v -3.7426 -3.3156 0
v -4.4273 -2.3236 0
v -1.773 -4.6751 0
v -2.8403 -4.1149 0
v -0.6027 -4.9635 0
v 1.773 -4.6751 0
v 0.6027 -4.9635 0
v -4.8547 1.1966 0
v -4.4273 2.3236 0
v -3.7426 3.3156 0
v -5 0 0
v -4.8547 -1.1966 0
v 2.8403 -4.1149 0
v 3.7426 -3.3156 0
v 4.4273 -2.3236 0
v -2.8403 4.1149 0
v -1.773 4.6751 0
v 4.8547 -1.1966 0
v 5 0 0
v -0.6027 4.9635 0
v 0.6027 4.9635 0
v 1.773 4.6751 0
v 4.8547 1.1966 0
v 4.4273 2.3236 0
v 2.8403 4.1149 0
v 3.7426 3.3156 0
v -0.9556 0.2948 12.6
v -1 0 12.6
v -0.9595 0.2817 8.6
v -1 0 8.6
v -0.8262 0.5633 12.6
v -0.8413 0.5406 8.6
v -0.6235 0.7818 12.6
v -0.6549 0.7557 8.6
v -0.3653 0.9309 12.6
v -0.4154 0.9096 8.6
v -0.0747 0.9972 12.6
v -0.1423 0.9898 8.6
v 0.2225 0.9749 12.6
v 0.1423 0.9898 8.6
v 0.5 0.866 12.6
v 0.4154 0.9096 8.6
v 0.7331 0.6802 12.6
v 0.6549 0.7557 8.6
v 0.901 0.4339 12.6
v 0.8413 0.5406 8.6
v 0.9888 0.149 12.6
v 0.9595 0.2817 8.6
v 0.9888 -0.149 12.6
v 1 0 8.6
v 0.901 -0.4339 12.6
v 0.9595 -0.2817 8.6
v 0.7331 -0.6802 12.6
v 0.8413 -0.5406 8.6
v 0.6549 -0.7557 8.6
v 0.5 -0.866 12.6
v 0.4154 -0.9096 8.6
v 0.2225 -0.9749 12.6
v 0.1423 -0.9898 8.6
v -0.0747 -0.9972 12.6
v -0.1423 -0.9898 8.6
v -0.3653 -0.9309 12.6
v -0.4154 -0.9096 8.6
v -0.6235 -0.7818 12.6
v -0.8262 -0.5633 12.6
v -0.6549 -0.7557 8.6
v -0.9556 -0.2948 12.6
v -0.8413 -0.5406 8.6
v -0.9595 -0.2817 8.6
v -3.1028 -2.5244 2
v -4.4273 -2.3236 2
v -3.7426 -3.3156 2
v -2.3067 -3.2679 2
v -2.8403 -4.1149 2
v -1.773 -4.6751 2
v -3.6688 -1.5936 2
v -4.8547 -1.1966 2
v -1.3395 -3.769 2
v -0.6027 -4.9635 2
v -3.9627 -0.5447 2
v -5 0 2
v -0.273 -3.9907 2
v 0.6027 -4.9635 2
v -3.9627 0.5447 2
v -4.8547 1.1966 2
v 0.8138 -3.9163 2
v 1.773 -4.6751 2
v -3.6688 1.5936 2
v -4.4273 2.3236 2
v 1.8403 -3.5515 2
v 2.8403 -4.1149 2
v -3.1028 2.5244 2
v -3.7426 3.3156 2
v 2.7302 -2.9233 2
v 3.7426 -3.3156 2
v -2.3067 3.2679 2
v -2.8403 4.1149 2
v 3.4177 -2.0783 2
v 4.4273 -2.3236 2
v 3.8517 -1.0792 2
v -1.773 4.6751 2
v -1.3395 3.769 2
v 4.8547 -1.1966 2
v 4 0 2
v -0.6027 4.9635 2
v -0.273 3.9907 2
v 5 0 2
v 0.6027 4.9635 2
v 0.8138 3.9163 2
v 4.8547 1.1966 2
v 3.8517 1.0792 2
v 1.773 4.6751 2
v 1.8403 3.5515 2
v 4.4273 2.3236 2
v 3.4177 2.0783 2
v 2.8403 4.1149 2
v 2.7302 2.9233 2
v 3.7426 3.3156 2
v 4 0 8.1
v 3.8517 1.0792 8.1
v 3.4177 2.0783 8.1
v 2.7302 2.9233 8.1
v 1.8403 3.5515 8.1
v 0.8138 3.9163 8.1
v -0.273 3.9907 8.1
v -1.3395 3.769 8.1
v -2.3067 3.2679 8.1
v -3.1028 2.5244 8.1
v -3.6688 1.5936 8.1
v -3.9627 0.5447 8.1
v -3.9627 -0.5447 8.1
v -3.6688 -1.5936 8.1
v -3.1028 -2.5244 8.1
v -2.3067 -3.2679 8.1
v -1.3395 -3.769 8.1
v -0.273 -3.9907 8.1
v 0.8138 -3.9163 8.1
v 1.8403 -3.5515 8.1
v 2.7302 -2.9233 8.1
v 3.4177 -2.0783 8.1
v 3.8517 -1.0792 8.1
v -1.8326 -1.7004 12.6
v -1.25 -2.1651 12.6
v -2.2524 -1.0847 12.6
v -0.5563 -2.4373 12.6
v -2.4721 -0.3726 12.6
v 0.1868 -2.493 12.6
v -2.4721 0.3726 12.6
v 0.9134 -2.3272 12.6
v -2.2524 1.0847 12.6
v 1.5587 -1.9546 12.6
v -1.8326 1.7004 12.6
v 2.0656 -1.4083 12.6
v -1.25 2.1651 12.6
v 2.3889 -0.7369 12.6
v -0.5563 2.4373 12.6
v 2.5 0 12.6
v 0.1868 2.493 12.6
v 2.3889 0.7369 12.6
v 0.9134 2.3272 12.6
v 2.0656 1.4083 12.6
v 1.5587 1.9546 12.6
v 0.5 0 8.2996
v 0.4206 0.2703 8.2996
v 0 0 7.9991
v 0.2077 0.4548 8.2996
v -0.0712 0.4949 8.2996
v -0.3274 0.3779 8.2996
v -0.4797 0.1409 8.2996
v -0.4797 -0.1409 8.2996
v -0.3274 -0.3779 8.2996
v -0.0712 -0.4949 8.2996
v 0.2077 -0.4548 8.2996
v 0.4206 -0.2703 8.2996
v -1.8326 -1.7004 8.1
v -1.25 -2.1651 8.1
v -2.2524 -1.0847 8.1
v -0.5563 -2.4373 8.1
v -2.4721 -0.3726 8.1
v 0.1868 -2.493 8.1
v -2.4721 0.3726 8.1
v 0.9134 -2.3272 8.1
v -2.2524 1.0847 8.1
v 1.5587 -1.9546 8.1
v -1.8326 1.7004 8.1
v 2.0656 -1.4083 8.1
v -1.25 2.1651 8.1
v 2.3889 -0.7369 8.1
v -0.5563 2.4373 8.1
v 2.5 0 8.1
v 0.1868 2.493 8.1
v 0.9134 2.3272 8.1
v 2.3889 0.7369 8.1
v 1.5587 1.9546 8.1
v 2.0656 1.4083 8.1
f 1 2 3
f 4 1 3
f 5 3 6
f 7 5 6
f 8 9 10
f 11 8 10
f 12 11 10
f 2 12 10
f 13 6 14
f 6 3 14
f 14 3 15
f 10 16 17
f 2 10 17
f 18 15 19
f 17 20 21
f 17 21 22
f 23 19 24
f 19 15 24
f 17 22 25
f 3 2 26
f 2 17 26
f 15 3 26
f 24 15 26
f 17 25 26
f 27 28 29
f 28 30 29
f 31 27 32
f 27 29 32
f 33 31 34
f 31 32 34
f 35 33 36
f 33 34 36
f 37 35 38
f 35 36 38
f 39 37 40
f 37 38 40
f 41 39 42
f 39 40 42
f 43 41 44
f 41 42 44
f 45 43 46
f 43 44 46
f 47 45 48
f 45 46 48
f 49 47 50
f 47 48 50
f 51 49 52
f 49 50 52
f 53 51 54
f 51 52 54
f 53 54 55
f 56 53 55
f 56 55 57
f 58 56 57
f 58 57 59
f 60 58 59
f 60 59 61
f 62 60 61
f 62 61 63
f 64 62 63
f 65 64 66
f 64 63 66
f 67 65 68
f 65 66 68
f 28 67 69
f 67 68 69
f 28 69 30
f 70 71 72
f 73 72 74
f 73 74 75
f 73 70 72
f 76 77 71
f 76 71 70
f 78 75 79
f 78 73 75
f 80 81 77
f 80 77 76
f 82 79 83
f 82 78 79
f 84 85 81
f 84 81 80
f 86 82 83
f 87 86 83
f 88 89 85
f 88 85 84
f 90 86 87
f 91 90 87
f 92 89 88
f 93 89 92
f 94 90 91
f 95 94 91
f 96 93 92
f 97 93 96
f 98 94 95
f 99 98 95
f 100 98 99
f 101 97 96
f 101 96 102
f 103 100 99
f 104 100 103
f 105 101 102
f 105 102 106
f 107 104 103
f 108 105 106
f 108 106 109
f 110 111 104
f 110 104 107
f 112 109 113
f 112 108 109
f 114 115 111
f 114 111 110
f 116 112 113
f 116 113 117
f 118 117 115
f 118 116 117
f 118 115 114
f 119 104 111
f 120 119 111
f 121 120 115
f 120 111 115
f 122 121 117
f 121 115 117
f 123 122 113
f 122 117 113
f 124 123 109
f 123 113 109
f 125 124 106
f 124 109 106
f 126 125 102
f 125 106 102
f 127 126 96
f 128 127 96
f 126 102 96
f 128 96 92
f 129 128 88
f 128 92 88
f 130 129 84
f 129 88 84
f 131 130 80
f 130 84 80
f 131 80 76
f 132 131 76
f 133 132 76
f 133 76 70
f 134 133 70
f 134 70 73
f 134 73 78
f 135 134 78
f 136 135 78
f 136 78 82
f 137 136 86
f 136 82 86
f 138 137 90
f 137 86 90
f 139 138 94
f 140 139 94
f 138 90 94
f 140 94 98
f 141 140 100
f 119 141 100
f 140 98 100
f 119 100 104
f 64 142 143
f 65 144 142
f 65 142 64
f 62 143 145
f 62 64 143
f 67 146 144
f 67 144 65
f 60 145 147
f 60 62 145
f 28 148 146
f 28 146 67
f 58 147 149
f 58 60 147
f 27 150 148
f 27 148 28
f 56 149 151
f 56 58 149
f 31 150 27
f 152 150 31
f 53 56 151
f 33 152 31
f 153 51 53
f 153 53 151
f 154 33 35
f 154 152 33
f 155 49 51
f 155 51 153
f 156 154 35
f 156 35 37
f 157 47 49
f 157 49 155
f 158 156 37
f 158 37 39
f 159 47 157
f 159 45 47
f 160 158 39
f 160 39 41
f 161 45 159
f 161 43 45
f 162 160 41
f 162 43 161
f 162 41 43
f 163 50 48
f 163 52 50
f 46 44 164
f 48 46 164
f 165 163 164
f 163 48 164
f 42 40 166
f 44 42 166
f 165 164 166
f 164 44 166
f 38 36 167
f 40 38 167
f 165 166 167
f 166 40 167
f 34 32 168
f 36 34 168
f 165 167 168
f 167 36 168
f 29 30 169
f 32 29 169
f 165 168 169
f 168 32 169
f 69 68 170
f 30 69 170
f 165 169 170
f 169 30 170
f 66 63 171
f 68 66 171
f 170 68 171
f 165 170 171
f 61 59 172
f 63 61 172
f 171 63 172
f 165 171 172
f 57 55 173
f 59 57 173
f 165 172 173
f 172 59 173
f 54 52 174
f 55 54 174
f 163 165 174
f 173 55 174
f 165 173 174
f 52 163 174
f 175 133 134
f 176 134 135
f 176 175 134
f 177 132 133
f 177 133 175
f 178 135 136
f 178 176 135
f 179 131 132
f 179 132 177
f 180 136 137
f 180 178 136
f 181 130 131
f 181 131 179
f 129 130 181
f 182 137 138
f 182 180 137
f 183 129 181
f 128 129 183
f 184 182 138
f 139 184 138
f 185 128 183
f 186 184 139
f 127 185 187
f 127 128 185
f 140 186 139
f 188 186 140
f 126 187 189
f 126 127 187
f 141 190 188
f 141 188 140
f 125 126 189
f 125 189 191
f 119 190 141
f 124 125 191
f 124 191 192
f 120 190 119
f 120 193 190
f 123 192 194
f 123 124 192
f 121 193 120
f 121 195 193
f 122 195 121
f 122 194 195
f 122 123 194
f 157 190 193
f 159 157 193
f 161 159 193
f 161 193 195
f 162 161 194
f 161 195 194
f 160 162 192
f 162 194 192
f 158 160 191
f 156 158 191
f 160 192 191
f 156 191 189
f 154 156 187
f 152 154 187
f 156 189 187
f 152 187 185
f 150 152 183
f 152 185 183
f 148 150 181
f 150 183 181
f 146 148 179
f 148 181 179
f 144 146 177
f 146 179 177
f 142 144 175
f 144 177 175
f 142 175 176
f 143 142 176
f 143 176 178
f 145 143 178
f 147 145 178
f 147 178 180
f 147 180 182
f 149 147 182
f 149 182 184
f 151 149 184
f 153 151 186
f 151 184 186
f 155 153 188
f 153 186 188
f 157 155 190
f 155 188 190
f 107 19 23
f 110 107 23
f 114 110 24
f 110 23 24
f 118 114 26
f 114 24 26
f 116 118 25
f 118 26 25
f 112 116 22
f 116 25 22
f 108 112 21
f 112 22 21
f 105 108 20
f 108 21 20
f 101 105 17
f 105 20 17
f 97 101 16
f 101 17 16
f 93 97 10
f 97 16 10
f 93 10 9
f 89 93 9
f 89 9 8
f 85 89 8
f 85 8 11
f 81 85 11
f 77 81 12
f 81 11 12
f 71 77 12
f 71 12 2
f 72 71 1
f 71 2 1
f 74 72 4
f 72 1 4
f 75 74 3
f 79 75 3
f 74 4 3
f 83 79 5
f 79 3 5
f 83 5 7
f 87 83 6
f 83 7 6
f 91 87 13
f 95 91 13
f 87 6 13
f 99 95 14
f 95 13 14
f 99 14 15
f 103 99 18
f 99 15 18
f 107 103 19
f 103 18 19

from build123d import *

# Parameters (mm, degrees)
F0_R     = 5
F1_DEPTH = 2
F2_R     = 4
F3_DEPTH = 6.1
F4_R     = 2.5
F5_DEPTH = 4.5
F7_D     = 2
F7_DEPTH = 4
F7_TIP   = 0.600860619


with BuildPart() as f1:
    # F0 (on Top) → F1 (new body)
    with BuildSketch(Plane.XY):
        Circle(F0_R)
    extrude(amount=F1_DEPTH)

    # F2 (on face) → F3 (join)
    with BuildSketch(Plane.XY.offset(2)):
        Circle(F2_R)
    extrude(amount=F3_DEPTH)

    # F4 (on face) → F5 (join)
    with BuildSketch(Plane.XY.offset(8.1)):
        Circle(F4_R)
    extrude(amount=F5_DEPTH)

    # F7
    with Locations(Plane.XY.offset(12.6)):
        with Locations((0, 0)):
            Hole(F7_D / 2, depth=F7_DEPTH)
            with Locations((0, 0, -(F7_DEPTH + F7_TIP / 2))):  # 118° drill point
                Cone(0, F7_D / 2, F7_TIP, mode=Mode.SUBTRACT)


solid = f1.part
